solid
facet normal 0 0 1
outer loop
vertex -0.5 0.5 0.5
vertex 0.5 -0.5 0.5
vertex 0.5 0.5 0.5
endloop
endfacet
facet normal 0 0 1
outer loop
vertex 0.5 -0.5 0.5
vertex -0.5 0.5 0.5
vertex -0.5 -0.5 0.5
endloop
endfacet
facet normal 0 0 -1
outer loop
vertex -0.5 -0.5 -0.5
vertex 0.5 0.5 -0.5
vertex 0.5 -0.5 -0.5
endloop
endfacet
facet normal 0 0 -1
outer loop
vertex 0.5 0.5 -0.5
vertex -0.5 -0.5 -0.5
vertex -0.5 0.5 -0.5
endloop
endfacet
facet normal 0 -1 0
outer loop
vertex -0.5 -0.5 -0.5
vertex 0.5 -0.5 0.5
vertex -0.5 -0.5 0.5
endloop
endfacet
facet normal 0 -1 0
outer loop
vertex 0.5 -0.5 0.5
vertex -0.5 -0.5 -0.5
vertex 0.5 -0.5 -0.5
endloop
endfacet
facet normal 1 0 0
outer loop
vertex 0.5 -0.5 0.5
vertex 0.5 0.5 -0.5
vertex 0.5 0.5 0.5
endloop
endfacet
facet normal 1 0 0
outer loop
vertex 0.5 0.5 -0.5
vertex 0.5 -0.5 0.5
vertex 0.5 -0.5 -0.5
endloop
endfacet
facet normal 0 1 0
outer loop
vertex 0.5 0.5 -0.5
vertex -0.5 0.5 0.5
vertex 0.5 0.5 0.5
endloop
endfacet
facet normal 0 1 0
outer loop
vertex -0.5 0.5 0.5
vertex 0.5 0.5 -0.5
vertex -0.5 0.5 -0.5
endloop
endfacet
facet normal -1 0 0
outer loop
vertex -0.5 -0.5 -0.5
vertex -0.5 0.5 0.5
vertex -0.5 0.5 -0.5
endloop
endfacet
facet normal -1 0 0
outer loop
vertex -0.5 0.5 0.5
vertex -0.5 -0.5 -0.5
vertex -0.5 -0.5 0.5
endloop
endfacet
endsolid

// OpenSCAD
// Generated by Mecha (https://github.com/tomahawkins/mecha)

color([0.5, 0.5, 0.5, 1.0]) translate ([-0.5, -0.5, -0.5]) cube(size = [1.0, 1.0, 1.0], center = false);
